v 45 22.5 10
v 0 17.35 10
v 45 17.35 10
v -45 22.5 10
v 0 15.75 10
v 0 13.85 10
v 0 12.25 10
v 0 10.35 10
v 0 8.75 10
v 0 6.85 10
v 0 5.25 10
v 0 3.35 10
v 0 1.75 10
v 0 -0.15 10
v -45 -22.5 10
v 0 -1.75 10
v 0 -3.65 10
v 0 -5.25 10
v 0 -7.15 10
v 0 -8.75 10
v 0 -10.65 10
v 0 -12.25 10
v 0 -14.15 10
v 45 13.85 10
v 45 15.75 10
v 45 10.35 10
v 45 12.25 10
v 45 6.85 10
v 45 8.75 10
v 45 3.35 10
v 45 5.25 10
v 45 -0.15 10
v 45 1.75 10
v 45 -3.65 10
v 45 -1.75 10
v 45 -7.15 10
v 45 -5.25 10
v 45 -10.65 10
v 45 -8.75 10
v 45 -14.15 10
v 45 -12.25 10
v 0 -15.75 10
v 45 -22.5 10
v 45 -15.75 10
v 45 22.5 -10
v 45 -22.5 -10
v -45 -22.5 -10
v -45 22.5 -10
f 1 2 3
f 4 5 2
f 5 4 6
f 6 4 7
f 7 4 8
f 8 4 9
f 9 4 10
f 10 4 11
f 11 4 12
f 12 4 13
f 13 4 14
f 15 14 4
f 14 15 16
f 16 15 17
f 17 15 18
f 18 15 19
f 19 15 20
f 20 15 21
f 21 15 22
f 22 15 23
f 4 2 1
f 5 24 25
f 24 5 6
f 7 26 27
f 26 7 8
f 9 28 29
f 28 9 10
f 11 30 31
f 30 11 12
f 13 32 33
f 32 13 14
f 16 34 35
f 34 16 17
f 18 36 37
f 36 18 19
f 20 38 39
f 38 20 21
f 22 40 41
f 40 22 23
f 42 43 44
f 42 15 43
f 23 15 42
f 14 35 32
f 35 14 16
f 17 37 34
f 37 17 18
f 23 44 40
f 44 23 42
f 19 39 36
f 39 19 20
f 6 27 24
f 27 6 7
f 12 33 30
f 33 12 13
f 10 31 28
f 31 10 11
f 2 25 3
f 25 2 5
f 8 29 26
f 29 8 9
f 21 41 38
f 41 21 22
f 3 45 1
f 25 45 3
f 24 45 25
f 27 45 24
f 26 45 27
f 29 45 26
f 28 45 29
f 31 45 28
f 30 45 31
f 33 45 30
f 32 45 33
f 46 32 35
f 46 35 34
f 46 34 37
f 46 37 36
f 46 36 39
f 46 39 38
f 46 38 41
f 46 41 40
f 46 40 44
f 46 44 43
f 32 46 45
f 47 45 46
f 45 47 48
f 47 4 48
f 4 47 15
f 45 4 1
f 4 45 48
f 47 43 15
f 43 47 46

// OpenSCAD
// Drying Rack for 10 Microscope Slides
// Base: 90 x 45 x 20 mm
// Slots: 10 parallel slots along X, 77mm long, 1.6mm wide, 10mm deep
// Spacing: 3.5mm centre-to-centre in Y

$fn = 128;

// Base Dimensions
base_length = 90;   // X
base_width = 45;    // Y
base_height = 20;   // Z

// Slot Dimensions
num_slots = 10;
slot_length = 77;   // X (runs along length)
slot_width = 1.6;   // Y
slot_depth = 10;    // Z

// Spacing
slot_spacing = 3.5; // Centre-to-centre in Y

// Calculation for Y positioning
// The group of slot centers must be centered on the block (Y=0).
// The distance from the center of the block to the center of the first slot is:
// (base_width - (num_slots * slot_width)) / 2 + (slot_width / 2)
// However, it is easier to calculate the position of the i-th slot directly.
// The centers are spaced by slot_spacing.
// The center of the first slot (i=0) is at: - (num_slots - 1) * slot_spacing / 2
// The center of the i-th slot is: i * slot_spacing + center_of_first_slot

// Main Block
difference() {
    // 1. The Solid Base
    // Centered at origin: X from -45 to 45, Y from -22.5 to 22.5, Z from -10 to 10
    cube([base_length, base_width, base_height], center = true);
    
    // 2. The Slots (Cutting shapes)
    // We cut 10 slots. Each slot is a rectangular prism.
    // Dimensions: length X, width Y, depth Z.
    // The slot is open at the top. The block top is at Z=10.
    // The slot goes from Z=10 down to Z=0 (10mm deep).
    // We extend the cutting shape slightly below Z=0 (to Z=-0.1) to ensure clean removal.
    
    // Calculate the Y offset for the first slot to center the group
    first_slot_y = -((num_slots - 1) * slot_spacing) / 2;
    
    for (i = [0 : num_slots - 1]) {
        y_pos = first_slot_y + (i * slot_spacing);
        
        translate([0, y_pos, 10]) {
            // Slot dimensions:
            // X: 77mm
            // Y: 1.6mm
            // Z: 10mm deep (from Z=10 down to Z=0)
            // We add 0.1mm extension below Z=0 for clean cutting
            cube([slot_length, slot_width, slot_depth + 0.1], center = [0, 0, -slot_depth/2]);
        }
    }
}
